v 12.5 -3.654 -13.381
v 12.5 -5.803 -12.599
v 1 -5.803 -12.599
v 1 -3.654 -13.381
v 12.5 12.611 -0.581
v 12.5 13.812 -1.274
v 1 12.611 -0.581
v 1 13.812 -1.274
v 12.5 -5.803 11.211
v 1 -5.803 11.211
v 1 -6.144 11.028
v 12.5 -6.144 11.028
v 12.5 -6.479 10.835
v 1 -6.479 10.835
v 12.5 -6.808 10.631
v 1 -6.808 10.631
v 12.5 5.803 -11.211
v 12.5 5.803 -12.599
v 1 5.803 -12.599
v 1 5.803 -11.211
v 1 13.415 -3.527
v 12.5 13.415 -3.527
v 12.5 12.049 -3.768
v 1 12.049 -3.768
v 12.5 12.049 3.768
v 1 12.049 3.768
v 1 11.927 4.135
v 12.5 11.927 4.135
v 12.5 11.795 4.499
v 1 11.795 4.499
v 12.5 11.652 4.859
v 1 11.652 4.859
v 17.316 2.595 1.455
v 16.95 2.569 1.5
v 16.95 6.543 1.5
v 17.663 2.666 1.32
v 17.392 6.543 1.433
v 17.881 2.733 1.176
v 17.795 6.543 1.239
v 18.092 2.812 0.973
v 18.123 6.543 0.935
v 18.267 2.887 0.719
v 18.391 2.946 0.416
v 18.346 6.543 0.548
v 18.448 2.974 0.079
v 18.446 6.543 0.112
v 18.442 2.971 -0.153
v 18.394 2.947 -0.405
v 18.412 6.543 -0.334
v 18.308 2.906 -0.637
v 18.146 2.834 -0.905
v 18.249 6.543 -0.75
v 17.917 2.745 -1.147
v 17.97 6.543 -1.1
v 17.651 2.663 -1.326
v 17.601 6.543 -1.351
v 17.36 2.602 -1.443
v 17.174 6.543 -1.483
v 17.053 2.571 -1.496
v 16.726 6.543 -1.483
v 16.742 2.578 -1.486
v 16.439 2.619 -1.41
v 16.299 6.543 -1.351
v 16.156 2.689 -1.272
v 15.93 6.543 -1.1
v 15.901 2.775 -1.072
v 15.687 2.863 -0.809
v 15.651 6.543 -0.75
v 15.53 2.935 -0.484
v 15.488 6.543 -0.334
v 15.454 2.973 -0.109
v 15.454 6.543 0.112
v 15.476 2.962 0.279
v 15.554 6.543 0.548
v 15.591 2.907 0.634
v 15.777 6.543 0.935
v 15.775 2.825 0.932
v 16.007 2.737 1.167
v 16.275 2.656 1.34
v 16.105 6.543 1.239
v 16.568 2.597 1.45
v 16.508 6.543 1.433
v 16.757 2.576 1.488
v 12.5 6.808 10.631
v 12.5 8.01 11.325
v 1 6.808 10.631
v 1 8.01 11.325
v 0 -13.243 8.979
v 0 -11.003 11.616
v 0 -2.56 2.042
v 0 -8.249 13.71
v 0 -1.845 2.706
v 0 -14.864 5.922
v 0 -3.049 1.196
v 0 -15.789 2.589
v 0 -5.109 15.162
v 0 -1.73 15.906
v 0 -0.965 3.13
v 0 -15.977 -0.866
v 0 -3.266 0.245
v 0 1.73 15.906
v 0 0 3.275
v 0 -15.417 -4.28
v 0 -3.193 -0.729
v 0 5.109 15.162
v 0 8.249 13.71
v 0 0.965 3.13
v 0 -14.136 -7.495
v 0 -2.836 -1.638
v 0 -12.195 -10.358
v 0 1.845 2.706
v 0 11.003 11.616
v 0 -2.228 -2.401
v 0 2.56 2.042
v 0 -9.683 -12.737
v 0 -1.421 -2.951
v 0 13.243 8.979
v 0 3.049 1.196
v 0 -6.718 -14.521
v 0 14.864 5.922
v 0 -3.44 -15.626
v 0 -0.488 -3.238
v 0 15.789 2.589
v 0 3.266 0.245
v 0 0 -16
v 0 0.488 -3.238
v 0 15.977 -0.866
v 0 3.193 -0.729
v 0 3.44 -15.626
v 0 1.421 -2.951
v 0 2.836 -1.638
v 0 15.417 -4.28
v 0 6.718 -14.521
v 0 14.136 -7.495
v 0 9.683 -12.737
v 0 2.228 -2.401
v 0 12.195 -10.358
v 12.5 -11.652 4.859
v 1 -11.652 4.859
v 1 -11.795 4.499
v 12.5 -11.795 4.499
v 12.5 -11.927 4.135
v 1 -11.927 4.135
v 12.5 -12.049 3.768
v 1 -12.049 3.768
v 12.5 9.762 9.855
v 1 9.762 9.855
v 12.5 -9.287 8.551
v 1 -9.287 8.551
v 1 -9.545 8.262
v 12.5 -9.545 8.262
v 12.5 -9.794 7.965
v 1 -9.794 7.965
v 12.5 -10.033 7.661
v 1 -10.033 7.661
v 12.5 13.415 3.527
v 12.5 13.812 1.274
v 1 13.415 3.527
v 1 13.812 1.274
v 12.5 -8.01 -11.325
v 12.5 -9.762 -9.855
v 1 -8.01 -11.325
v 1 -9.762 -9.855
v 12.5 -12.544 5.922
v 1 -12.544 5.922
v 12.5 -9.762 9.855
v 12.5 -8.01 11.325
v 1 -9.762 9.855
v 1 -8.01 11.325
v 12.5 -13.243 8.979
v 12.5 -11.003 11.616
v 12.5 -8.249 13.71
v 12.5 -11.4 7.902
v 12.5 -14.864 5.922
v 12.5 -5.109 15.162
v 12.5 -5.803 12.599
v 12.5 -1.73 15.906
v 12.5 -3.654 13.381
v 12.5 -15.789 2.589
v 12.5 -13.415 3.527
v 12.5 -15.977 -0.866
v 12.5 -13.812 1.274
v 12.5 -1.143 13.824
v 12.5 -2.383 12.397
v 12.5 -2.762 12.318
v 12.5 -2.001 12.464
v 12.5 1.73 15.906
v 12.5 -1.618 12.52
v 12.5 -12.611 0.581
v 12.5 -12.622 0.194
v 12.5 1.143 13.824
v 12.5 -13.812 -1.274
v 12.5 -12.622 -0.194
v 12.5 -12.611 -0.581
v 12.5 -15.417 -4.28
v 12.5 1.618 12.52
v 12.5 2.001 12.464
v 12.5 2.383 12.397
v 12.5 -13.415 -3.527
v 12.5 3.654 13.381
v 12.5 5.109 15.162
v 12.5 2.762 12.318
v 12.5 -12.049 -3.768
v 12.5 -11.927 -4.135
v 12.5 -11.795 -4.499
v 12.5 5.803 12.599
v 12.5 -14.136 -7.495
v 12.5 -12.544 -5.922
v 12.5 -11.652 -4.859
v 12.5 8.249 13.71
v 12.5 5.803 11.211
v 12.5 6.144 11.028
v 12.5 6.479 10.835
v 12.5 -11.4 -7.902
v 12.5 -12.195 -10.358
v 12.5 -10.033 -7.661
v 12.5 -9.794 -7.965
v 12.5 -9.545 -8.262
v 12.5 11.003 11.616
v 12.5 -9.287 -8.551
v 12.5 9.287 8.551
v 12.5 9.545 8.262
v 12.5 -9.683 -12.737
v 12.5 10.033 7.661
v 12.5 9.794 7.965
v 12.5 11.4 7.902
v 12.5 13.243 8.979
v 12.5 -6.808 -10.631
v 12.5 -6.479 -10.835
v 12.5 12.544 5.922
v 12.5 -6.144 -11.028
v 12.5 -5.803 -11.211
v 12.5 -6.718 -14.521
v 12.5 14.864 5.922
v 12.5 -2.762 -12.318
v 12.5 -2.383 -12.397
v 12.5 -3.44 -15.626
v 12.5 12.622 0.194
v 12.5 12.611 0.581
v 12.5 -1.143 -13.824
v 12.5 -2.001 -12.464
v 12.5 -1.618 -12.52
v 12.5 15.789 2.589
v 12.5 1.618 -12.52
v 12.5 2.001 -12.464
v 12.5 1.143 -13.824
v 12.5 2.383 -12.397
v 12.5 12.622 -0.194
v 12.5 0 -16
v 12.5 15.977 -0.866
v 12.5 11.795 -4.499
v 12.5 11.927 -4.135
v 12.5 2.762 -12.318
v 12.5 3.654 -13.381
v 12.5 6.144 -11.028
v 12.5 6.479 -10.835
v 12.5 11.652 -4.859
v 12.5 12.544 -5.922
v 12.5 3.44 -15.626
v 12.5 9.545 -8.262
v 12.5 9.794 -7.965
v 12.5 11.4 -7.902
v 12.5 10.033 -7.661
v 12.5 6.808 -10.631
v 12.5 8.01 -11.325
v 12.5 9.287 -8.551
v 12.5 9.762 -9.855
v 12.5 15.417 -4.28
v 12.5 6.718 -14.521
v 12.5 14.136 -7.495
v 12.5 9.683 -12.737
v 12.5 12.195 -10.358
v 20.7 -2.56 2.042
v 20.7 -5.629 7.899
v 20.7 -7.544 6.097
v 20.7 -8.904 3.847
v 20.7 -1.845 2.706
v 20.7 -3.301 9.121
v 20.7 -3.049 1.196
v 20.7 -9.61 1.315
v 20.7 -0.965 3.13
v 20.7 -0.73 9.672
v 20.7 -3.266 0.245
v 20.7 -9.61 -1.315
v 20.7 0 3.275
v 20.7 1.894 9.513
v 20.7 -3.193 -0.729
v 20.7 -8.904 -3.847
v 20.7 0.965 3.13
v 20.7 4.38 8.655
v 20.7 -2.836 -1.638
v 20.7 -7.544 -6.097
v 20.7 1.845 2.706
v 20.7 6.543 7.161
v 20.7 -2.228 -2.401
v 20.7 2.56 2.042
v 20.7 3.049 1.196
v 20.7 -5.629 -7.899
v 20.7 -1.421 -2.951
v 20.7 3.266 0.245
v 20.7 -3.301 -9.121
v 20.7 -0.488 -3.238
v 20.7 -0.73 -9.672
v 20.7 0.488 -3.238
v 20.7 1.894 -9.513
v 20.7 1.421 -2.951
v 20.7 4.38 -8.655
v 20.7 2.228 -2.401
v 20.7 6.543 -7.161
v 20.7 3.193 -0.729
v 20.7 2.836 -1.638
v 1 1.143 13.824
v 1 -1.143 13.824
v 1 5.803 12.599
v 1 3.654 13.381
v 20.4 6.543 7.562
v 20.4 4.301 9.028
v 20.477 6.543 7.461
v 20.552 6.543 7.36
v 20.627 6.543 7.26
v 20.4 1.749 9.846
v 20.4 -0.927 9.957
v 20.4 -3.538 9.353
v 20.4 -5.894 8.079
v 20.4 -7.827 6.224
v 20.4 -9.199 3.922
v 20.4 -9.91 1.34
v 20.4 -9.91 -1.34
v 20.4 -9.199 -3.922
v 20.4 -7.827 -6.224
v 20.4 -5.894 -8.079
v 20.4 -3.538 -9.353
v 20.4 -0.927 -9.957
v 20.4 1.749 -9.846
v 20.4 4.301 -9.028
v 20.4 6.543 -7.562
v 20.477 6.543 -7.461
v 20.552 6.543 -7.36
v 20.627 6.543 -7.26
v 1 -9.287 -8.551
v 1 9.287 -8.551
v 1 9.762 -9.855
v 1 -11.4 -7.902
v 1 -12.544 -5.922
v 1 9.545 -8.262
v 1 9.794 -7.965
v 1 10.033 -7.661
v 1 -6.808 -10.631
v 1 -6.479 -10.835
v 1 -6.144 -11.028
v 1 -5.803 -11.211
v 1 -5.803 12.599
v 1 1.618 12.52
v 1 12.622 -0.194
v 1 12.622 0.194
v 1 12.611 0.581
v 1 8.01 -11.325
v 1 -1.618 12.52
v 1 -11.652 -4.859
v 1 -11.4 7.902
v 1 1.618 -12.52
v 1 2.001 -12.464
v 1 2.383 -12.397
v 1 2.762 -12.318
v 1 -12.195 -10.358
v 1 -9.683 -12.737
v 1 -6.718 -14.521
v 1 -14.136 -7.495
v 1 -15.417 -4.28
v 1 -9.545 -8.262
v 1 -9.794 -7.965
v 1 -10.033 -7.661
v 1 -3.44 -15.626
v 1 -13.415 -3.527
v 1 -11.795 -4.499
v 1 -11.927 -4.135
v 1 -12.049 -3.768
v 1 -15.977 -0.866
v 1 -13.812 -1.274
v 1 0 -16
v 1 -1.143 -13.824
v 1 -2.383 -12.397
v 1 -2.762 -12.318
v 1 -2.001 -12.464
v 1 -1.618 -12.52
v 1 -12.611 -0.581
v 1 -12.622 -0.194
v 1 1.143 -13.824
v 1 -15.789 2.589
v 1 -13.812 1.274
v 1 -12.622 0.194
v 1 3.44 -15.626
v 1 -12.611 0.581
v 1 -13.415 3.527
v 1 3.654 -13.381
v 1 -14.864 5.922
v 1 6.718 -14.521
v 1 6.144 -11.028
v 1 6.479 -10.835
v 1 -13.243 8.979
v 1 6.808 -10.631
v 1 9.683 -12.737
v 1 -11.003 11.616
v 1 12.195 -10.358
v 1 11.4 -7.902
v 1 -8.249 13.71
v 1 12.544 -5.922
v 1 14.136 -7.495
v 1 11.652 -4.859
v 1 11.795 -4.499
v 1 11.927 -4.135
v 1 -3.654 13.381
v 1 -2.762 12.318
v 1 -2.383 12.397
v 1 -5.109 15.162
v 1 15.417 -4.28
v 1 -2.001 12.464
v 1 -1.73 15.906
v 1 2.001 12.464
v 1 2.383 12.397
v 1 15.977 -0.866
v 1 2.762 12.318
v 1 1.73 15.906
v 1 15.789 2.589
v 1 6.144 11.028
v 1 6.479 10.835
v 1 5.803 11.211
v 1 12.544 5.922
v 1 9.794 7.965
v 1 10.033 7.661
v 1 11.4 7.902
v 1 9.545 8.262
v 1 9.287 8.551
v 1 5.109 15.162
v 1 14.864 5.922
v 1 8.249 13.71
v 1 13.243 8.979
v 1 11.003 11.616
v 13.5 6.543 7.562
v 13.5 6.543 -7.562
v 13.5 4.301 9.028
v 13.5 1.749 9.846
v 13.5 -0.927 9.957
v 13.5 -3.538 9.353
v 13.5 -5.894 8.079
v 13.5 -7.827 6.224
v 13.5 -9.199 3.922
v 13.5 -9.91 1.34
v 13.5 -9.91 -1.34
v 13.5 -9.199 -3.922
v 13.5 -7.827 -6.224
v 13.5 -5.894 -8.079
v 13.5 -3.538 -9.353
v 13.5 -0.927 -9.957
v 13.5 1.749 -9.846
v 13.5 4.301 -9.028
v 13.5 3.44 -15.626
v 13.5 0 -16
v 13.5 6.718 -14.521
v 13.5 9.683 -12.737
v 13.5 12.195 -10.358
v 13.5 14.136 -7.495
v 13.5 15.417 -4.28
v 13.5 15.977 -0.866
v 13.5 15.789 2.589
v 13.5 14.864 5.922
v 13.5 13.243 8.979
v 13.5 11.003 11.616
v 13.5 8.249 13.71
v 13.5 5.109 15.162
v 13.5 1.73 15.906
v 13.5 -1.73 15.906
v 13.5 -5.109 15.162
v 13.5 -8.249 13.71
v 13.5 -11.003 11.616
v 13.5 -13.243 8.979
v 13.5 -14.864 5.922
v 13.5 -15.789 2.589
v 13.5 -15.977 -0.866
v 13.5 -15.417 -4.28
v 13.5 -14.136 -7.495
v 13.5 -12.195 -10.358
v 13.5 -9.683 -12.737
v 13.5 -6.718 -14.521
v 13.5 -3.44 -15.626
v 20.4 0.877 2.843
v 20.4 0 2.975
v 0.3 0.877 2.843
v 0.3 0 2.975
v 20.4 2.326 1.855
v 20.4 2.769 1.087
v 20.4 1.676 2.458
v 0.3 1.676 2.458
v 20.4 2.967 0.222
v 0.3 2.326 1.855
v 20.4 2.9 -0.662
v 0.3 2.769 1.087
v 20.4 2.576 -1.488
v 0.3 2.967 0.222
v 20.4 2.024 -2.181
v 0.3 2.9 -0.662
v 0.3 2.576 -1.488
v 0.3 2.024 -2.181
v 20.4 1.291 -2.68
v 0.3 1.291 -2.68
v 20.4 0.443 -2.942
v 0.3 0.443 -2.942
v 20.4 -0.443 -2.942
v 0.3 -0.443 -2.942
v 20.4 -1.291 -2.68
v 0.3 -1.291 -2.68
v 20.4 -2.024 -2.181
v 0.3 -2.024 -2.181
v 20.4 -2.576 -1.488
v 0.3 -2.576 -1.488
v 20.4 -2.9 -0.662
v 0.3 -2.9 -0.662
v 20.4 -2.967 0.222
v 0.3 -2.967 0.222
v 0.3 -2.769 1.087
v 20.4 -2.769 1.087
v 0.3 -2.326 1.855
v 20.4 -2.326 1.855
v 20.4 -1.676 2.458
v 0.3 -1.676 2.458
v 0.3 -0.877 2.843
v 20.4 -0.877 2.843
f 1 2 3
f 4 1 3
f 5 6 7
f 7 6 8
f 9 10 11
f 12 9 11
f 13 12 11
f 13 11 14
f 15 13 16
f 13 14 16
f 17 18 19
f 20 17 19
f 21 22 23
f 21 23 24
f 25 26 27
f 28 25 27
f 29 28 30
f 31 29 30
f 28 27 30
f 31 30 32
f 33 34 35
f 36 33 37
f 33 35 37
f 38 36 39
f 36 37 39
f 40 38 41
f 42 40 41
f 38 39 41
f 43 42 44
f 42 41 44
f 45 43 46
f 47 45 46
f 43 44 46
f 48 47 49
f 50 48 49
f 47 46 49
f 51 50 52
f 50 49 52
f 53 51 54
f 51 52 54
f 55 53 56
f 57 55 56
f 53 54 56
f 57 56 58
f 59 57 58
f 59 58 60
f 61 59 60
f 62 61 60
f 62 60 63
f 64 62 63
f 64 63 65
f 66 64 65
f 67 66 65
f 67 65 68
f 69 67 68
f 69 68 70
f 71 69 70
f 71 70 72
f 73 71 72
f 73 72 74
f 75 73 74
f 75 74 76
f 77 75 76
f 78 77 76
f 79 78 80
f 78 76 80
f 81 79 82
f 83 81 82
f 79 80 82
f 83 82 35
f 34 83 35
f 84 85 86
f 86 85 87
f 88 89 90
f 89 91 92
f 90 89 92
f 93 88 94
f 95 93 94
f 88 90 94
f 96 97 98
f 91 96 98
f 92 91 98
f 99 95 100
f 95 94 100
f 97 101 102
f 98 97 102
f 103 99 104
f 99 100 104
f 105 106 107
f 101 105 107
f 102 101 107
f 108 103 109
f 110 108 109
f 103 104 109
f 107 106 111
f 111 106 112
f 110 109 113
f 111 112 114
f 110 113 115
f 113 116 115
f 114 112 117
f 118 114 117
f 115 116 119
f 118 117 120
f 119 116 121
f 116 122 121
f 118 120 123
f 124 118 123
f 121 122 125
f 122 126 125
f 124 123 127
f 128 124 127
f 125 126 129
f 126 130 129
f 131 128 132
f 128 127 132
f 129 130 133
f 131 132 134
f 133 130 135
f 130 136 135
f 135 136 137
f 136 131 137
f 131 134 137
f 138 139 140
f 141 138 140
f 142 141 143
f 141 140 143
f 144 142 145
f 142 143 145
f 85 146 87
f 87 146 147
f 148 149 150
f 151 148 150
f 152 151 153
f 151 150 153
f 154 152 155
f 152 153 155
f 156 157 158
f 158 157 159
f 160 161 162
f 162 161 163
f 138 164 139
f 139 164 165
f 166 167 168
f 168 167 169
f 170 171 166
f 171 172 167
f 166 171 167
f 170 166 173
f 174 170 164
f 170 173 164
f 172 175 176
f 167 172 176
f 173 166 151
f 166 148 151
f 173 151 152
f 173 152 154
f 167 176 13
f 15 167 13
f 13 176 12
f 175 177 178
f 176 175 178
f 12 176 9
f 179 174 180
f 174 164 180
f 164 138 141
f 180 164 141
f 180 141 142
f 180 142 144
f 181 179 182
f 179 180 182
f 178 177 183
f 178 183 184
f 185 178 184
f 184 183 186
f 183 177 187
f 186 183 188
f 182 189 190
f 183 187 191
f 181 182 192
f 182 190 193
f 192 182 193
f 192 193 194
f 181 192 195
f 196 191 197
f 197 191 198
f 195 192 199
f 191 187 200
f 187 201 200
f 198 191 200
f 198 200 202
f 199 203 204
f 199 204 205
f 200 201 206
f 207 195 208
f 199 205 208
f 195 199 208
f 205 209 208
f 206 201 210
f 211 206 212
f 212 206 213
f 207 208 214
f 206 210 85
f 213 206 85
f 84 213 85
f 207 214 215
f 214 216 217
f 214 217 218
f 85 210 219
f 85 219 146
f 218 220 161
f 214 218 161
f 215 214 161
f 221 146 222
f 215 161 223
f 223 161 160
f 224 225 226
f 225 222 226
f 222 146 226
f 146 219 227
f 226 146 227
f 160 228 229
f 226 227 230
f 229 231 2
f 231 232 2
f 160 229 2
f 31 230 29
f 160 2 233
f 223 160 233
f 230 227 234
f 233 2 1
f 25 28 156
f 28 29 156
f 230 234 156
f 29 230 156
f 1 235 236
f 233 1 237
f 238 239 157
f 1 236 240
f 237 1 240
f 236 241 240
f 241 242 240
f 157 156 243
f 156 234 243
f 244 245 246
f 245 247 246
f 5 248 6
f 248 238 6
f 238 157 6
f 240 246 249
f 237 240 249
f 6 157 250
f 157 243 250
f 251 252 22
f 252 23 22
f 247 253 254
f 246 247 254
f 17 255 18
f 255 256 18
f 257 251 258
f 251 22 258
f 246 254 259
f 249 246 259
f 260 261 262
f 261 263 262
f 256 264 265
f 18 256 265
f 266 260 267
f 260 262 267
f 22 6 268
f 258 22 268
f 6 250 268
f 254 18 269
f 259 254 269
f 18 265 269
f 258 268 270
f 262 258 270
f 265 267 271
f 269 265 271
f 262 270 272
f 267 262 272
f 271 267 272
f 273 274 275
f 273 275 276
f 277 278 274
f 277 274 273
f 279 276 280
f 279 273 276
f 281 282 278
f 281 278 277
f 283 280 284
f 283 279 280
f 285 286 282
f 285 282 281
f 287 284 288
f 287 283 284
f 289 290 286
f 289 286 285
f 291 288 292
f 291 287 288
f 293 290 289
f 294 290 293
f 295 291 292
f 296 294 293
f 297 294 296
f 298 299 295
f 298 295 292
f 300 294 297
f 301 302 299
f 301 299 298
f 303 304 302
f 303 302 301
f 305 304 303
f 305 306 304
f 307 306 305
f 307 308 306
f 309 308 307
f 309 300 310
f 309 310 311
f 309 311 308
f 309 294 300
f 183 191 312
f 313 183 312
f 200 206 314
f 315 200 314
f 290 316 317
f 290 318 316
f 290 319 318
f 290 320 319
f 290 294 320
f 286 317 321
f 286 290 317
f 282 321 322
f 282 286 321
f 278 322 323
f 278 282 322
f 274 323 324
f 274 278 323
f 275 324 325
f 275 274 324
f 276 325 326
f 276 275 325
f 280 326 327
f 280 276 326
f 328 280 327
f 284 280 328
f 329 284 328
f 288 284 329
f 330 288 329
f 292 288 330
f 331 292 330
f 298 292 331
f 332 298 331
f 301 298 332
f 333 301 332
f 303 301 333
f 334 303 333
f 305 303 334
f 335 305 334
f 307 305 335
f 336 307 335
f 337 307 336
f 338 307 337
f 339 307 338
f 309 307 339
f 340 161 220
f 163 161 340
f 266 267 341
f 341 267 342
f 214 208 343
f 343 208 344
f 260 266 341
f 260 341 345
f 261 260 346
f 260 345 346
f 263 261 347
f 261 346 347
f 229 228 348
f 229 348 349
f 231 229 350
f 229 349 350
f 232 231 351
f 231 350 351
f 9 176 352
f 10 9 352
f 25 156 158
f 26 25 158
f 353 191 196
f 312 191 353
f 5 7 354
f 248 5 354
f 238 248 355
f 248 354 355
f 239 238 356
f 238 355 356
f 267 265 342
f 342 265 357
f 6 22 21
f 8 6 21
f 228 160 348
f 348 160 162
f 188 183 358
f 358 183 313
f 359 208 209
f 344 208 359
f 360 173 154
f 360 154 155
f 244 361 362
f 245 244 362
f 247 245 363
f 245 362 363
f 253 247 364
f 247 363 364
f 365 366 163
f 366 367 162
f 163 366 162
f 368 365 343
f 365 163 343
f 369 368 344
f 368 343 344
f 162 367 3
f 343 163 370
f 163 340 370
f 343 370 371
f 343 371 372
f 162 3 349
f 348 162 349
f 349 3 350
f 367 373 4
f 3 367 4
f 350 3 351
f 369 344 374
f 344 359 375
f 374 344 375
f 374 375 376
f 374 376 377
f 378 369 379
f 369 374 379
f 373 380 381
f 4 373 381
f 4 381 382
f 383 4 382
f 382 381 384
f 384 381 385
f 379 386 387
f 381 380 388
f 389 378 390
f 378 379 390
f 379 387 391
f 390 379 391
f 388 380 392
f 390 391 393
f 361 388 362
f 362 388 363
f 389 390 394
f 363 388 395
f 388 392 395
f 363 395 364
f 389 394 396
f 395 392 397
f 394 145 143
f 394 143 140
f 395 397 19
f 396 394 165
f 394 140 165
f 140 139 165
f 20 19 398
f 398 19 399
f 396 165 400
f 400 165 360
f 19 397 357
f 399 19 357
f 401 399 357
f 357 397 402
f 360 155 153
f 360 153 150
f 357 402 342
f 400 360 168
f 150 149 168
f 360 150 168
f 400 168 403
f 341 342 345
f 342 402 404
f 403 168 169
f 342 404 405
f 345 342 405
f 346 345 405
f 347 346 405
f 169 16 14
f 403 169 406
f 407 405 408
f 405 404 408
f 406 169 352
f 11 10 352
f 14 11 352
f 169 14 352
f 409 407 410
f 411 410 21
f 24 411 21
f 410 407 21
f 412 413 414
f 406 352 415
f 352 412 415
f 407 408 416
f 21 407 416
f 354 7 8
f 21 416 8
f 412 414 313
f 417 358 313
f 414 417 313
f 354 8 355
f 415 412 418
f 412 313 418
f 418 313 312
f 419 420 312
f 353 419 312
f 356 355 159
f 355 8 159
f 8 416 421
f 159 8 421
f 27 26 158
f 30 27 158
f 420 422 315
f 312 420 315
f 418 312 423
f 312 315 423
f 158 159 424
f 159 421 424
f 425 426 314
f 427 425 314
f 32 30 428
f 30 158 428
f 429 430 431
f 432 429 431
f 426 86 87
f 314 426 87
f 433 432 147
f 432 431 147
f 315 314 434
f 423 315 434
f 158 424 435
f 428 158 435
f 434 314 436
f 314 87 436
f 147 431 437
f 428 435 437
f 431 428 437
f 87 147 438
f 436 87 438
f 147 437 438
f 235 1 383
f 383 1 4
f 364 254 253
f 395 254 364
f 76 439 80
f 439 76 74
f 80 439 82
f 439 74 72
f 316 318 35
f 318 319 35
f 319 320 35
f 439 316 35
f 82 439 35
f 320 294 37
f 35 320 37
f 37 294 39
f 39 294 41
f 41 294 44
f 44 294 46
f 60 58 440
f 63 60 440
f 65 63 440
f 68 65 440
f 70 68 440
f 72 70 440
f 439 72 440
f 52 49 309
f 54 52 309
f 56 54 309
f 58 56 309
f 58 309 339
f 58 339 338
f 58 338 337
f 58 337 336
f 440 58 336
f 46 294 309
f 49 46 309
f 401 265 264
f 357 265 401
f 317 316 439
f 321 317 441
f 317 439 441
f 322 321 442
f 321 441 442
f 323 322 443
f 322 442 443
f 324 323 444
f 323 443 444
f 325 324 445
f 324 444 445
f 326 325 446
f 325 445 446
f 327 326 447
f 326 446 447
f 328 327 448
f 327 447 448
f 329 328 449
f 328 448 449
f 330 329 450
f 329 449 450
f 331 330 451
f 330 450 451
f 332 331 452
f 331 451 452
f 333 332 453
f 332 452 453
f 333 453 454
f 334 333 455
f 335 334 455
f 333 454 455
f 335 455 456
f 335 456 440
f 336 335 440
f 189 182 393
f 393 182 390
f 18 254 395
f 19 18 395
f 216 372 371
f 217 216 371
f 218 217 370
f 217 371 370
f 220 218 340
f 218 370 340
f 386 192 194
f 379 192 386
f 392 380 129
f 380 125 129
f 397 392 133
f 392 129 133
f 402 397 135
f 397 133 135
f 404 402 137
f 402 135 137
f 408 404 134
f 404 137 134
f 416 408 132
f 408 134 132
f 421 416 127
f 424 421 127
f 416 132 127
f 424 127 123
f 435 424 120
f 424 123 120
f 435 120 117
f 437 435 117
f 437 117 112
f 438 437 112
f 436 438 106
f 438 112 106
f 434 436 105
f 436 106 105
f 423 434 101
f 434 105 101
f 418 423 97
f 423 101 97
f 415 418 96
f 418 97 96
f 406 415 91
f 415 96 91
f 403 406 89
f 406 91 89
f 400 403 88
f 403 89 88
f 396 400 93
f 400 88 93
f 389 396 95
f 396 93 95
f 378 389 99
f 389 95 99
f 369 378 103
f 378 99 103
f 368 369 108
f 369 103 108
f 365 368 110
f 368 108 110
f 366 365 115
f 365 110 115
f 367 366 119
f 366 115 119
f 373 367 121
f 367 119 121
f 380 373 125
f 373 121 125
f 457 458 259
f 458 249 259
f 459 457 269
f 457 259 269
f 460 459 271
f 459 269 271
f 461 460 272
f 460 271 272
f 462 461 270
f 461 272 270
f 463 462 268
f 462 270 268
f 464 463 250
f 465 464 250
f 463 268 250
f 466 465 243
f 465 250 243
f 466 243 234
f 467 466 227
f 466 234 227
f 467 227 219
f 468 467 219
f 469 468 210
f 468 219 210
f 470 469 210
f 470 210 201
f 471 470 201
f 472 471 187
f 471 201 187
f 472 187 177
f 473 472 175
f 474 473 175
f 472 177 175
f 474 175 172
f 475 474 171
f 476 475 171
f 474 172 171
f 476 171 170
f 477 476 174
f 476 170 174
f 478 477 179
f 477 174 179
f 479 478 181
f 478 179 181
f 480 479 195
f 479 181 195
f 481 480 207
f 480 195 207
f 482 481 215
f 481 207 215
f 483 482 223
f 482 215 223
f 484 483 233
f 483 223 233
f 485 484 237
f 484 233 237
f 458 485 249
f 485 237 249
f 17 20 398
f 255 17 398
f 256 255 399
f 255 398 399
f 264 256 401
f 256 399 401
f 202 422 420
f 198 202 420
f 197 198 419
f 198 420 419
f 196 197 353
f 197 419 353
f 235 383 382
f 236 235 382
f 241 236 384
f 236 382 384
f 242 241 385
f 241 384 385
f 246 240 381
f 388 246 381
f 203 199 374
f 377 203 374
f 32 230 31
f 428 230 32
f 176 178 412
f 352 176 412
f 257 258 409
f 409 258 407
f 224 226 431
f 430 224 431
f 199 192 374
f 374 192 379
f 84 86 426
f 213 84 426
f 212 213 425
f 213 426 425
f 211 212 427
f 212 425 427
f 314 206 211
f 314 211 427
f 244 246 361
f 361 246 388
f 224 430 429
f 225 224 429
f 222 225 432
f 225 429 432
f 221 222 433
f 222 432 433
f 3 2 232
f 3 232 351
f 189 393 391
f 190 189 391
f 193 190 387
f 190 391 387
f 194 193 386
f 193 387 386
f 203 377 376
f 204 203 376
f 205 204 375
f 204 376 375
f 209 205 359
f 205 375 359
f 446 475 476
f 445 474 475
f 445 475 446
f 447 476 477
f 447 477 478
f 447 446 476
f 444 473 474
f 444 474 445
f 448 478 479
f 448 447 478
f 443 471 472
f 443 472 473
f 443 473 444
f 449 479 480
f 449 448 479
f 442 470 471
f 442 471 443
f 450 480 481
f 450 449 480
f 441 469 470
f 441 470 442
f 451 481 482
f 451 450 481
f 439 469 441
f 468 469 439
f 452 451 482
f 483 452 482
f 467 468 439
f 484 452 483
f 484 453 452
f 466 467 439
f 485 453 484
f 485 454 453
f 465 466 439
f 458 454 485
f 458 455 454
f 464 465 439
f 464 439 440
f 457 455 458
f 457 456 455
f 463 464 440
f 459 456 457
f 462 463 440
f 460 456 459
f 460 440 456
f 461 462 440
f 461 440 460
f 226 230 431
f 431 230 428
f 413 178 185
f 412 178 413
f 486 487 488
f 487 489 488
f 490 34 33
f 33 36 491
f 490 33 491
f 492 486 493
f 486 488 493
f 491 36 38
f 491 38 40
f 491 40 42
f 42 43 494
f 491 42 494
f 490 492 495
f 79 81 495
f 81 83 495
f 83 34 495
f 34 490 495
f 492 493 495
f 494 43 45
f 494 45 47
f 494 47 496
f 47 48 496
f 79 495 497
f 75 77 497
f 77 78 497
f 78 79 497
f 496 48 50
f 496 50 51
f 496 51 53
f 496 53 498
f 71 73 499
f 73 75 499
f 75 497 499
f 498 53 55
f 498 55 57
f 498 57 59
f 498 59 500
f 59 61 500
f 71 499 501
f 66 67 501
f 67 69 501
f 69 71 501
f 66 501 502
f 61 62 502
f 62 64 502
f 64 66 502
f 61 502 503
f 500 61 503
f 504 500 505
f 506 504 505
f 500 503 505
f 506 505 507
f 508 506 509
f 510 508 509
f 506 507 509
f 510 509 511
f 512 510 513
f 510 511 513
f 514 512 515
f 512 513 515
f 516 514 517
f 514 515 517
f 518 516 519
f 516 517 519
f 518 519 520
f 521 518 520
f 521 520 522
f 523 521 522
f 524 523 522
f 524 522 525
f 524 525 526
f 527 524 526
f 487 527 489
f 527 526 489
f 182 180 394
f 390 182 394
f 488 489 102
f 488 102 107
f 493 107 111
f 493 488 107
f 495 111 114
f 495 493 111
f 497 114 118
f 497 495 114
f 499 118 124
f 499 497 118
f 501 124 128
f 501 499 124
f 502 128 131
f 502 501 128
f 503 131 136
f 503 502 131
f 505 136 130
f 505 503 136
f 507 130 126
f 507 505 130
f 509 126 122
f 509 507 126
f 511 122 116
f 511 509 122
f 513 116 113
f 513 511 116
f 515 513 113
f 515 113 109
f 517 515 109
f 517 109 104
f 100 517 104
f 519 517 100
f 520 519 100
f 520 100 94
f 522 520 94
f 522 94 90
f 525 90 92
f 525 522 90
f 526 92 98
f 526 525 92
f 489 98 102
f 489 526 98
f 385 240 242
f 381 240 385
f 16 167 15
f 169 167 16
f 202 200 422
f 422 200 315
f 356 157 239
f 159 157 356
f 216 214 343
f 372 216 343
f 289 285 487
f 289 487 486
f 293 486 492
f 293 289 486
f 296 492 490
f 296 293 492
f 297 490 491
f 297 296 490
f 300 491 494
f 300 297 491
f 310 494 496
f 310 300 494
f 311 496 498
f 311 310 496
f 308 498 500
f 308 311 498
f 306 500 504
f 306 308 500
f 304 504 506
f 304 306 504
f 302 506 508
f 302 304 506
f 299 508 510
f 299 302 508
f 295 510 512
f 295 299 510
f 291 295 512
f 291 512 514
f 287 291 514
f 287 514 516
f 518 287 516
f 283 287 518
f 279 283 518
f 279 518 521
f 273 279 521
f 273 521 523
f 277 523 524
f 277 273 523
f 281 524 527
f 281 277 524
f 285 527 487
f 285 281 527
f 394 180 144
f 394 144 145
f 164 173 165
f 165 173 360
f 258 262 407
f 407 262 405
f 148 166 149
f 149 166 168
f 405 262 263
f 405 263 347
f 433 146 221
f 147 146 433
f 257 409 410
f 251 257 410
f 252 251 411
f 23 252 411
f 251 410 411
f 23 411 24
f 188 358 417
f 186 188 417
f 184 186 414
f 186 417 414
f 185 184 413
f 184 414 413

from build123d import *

# Parameters (mm, degrees)
SKETCH2_R                = 10
BOSS_EXTRUDE1_DEPTH      = 7.2
F_6_0_6_DIAMETER_HOLE1_D = 5.95
RIB1_REACH               = 32.667
SKETCH5_WALL_W           = 74.834818822
SKETCH5_WALL_H           = 2.286845356
RIB1_DRAFT_ANGLE         = 20
RIB2_REACH               = 32.667
SKETCH6_WALL_W           = 74.834818822
SKETCH6_WALL_H           = 2.286845356
RIB2_DRAFT_ANGLE         = 20
RIB3_REACH               = 32.667
SKETCH7_WALL_W           = 74.834818822
SKETCH7_WALL_H           = 2.286845356
RIB3_DRAFT_ANGLE         = 20
RIB4_REACH               = 32.667
SKETCH8_WALL_W           = 74.834818822
SKETCH8_WALL_H           = 2.286845356
RIB4_DRAFT_ANGLE         = 20
RIB5_REACH               = 32.667
SKETCH9_WALL_W           = 74.834818822
SKETCH9_WALL_H           = 2.286845356
RIB5_DRAFT_ANGLE         = 20
RIB6_REACH               = 32.667
SKETCH10_WALL_W          = 74.834818822
SKETCH10_WALL_H          = 2.286845356
RIB6_DRAFT_ANGLE         = 20
RIB7_REACH               = 32.667
SKETCH11_WALL_W          = 74.834818822
SKETCH11_WALL_H          = 2.286845356
RIB7_DRAFT_ANGLE         = 20
RIB8_REACH               = 32.667
SKETCH12_WALL_W          = 74.834818822
SKETCH12_WALL_H          = 2.286845356
RIB8_DRAFT_ANGLE         = 20
RIB9_REACH               = 32.667
SKETCH13_WALL_W          = 74.834818822
SKETCH13_WALL_H          = 2.286845356
RIB9_DRAFT_ANGLE         = 20
RIB10_REACH              = 32.667
SKETCH14_WALL_W          = 74.834818822
SKETCH14_WALL_H          = 2.286845356
RIB10_DRAFT_ANGLE        = 20
RIB11_REACH              = 32.667
SKETCH15_WALL_W          = 74.834818822
SKETCH15_WALL_H          = 2.286845356
RIB11_DRAFT_ANGLE        = 20
RIB12_REACH              = 32.667
SKETCH16_WALL_W          = 74.834818822
SKETCH16_WALL_H          = 2.286845356
RIB12_DRAFT_ANGLE        = 20
RIB13_REACH              = 32.667
SKETCH17_WALL_W          = 74.834818822
SKETCH17_WALL_H          = 2.286845356
RIB13_DRAFT_ANGLE        = 20
RIB14_REACH              = 32.667
SKETCH18_WALL_W          = 74.834818822
SKETCH18_WALL_H          = 2.286845356
RIB14_DRAFT_ANGLE        = 20
RIB15_REACH              = 32.667
SKETCH19_WALL_W          = 74.834818822
SKETCH19_WALL_H          = 2.286845356
RIB15_DRAFT_ANGLE        = 20
RIB16_REACH              = 32.667
SKETCH20_WALL_W          = 74.834818822
SKETCH20_WALL_H          = 2.286845356
RIB16_DRAFT_ANGLE        = 20
RIB17_REACH              = 32.667
SKETCH21_WALL_W          = 74.834818822
SKETCH21_WALL_H          = 2.286845356
RIB17_DRAFT_ANGLE        = 20
RIB18_REACH              = 32.667
SKETCH22_WALL_W          = 74.834818822
SKETCH22_WALL_H          = 2.286845356
RIB18_DRAFT_ANGLE        = 20
CHAMFER1_SIZE            = 0.3
SKETCH23_W               = 15.124366872
SKETCH23_H               = 5.378173842
CUT_EXTRUDE2_DEPTH       = 7.2
SKETCH24_R               = 1.5
CUT_EXTRUDE3_DEPTH       = 7.2


with BuildPart() as part:
    # Sketch1 → Revolve1 (revolve)
    with BuildSketch(Plane.XY, mode=Mode.PRIVATE) as revolve1_sk:
        Polygon((0, 16), (0, 0), (13.5, 0), (13.5, 16), (12.5, 16), (12.5, 13.9), (12.5, 12.623944878), (1, 12.623944878), (1, 13.9), (1, 16), align=None)
    revolve(revolve1_sk.sketch.rotate(Axis((0, 0, 0), (1, 0, 0)), 270), axis=Axis((0, 0, 0), (1, 0, 0)))

    # Sketch2 → Boss-Extrude1 (add)
    with BuildSketch(Plane(origin=(13.5, 0, 0), x_dir=(0, 0, -1), z_dir=(1, 0, 0))):
        Circle(SKETCH2_R)
    extrude(amount=BOSS_EXTRUDE1_DEPTH)

    # Ø6.0 (6) Diameter Hole1 (through all)
    with Locations(Plane(origin=(20.7, 0, 0), x_dir=(0, 0, -1), z_dir=(1, 0, 0))):
        with Locations((0, 0)):
            Hole(F_6_0_6_DIAMETER_HOLE1_D / 2)

    # Sketch5 wall → Rib1 (add, up to next)
    with BuildSketch(Plane(origin=(6.9, 0, 13.823944878), x_dir=(-1, 0, 0), z_dir=(0, 0, -1)), mode=Mode.PRIVATE) as rib1_sk1:
        Rectangle(SKETCH5_WALL_W, SKETCH5_WALL_H)
    rib1_tool1 = extrude(rib1_sk1.sketch, amount=RIB1_REACH, mode=Mode.PRIVATE) - part.part
    add(rib1_tool1.solids().sort_by_distance((6.9, 0, 13.823944878))[0])

    # Rib1 draft
    rib1_draft_faces = [part.faces().sort_by_distance(p)[0] for p in [
        (6.9, 1.143422678, 13.323944878),
        (6.9, -1.143422678, 13.323944878),
    ]]
    draft(rib1_draft_faces, Plane(origin=(6.9, 0, 13.823944878), x_dir=(-1, 0, 0), z_dir=(0, 0, 1)), RIB1_DRAFT_ANGLE)

    # Sketch6 wall → Rib2 (add, up to next)
    with BuildSketch(Plane(origin=(6.9, 0, -13.823944878), x_dir=(-1, 0, 0), z_dir=(0, 0, 1)), mode=Mode.PRIVATE) as rib2_sk1:
        Rectangle(SKETCH6_WALL_W, SKETCH6_WALL_H)
    rib2_tool1 = extrude(rib2_sk1.sketch, amount=RIB2_REACH, mode=Mode.PRIVATE) - part.part
    add(rib2_tool1.solids().sort_by_distance((6.9, 0, -13.823944878))[0])

    # Rib2 draft
    rib2_draft_faces = [part.faces().sort_by_distance(p)[0] for p in [
        (6.9, -1.143422678, -13.323944878),
        (6.9, 1.143422678, -13.323944878),
    ]]
    draft(rib2_draft_faces, Plane(origin=(6.9, 0, -13.823944878), x_dir=(-1, 0, 0), z_dir=(0, 0, -1)), RIB2_DRAFT_ANGLE)

    # Sketch7 wall → Rib3 (add, up to next)
    with BuildSketch(Plane(origin=(6.9, -11.971887445, -6.911972439), x_dir=(-1, 0, 0), z_dir=(0, 0.866025403784, 0.5)), mode=Mode.PRIVATE) as rib3_sk1:
        Rectangle(SKETCH7_WALL_W, SKETCH7_WALL_H)
    rib3_tool1 = extrude(rib3_sk1.sketch, amount=RIB3_REACH, mode=Mode.PRIVATE) - part.part
    add(rib3_tool1.solids().sort_by_distance((6.9, -11.971887445, -6.911972439))[0])

    # Rib3 draft
    rib3_draft_faces = [part.faces().sort_by_distance(p)[0] for p in [
        (6.9, -12.110586082, -5.671739353),
        (6.9, -10.967163404, -7.652205525),
    ]]
    draft(rib3_draft_faces, Plane(origin=(6.9, -11.971887445, -6.911972439), x_dir=(-1, 0, 0), z_dir=(0, -0.866025403784, -0.5)), RIB3_DRAFT_ANGLE)

    # Sketch8 wall → Rib4 (add, up to next)
    with BuildSketch(Plane(origin=(6.9, 4.728067609, -12.990258992), x_dir=(-1, 0, 0), z_dir=(0, -0.342020143326, 0.939692620786)), mode=Mode.PRIVATE) as rib4_sk1:
        Rectangle(SKETCH8_WALL_W, SKETCH8_WALL_H)
    rib4_tool1 = extrude(rib4_sk1.sketch, amount=RIB4_REACH, mode=Mode.PRIVATE) - part.part
    add(rib4_tool1.solids().sort_by_distance((6.9, 4.728067609, -12.990258992))[0])

    # Rib4 draft
    rib4_draft_faces = [part.faces().sort_by_distance(p)[0] for p in [
        (6.9, 3.482591685, -12.91148627),
        (6.9, 5.63152339, -12.129339093),
    ]]
    draft(rib4_draft_faces, Plane(origin=(6.9, 4.728067609, -12.990258992), x_dir=(-1, 0, 0), z_dir=(0, 0.342020143326, -0.939692620786)), RIB4_DRAFT_ANGLE)

    # Sketch9 wall → Rib5 (add, up to next)
    with BuildSketch(Plane(origin=(6.9, -4.728067609, 12.990258992), x_dir=(-1, 0, 0), z_dir=(0, 0.342020143326, -0.939692620786)), mode=Mode.PRIVATE) as rib5_sk1:
        Rectangle(SKETCH9_WALL_W, SKETCH9_WALL_H)
    rib5_tool1 = extrude(rib5_sk1.sketch, amount=RIB5_REACH, mode=Mode.PRIVATE) - part.part
    add(rib5_tool1.solids().sort_by_distance((6.9, -4.728067609, 12.990258992))[0])

    # Rib5 draft
    rib5_draft_faces = [part.faces().sort_by_distance(p)[0] for p in [
        (6.9, -3.482591685, 12.91148627),
        (6.9, -5.63152339, 12.129339093),
    ]]
    draft(rib5_draft_faces, Plane(origin=(6.9, -4.728067609, 12.990258992), x_dir=(-1, 0, 0), z_dir=(0, -0.342020143326, 0.939692620786)), RIB5_DRAFT_ANGLE)

    # Sketch10 wall → Rib6 (add, up to next)
    with BuildSketch(Plane(origin=(6.9, -13.613928093, 2.400502836), x_dir=(-1, 0, 0), z_dir=(0, 0.984807753012, -0.173648177667)), mode=Mode.PRIVATE) as rib6_sk1:
        Rectangle(SKETCH10_WALL_W, SKETCH10_WALL_H)
    rib6_tool1 = extrude(rib6_sk1.sketch, amount=RIB6_REACH, mode=Mode.PRIVATE) - part.part
    add(rib6_tool1.solids().sort_by_distance((6.9, -13.613928093, 2.400502836))[0])

    # Rib6 draft
    rib6_draft_faces = [part.faces().sort_by_distance(p)[0] for p in [
        (6.9, -12.922970952, 3.439730265),
        (6.9, -13.320077481, 1.187627229),
    ]]
    draft(rib6_draft_faces, Plane(origin=(6.9, -13.613928093, 2.400502836), x_dir=(-1, 0, 0), z_dir=(0, -0.984807753012, 0.173648177667)), RIB6_DRAFT_ANGLE)

    # Sketch11 wall → Rib7 (add, up to next)
    with BuildSketch(Plane(origin=(6.9, 13.613928093, 2.400502836), x_dir=(-1, 0, 0), z_dir=(0, -0.984807753012, -0.173648177667)), mode=Mode.PRIVATE) as rib7_sk1:
        Rectangle(SKETCH11_WALL_W, SKETCH11_WALL_H)
    rib7_tool1 = extrude(rib7_sk1.sketch, amount=RIB7_REACH, mode=Mode.PRIVATE) - part.part
    add(rib7_tool1.solids().sort_by_distance((6.9, 13.613928093, 2.400502836))[0])

    # Rib7 draft
    rib7_draft_faces = [part.faces().sort_by_distance(p)[0] for p in [
        (6.9, 13.320077481, 1.187627229),
        (6.9, 12.922970952, 3.439730265),
    ]]
    draft(rib7_draft_faces, Plane(origin=(6.9, 13.613928093, 2.400502836), x_dir=(-1, 0, 0), z_dir=(0, 0.984807753012, 0.173648177667)), RIB7_DRAFT_ANGLE)

    # Sketch12 wall → Rib8 (add, up to next)
    with BuildSketch(Plane(origin=(6.9, -13.613928093, -2.400502836), x_dir=(-1, 0, 0), z_dir=(0, 0.984807753012, 0.173648177667)), mode=Mode.PRIVATE) as rib8_sk1:
        Rectangle(SKETCH12_WALL_W, SKETCH12_WALL_H)
    rib8_tool1 = extrude(rib8_sk1.sketch, amount=RIB8_REACH, mode=Mode.PRIVATE) - part.part
    add(rib8_tool1.solids().sort_by_distance((6.9, -13.613928093, -2.400502836))[0])

    # Rib8 draft
    rib8_draft_faces = [part.faces().sort_by_distance(p)[0] for p in [
        (6.9, -13.320077481, -1.187627229),
        (6.9, -12.922970952, -3.439730265),
    ]]
    draft(rib8_draft_faces, Plane(origin=(6.9, -13.613928093, -2.400502836), x_dir=(-1, 0, 0), z_dir=(0, -0.984807753012, -0.173648177667)), RIB8_DRAFT_ANGLE)

    # Sketch13 wall → Rib9 (add, up to next)
    with BuildSketch(Plane(origin=(6.9, 11.971887445, -6.911972439), x_dir=(-1, 0, 0), z_dir=(0, -0.866025403784, 0.5)), mode=Mode.PRIVATE) as rib9_sk1:
        Rectangle(SKETCH13_WALL_W, SKETCH13_WALL_H)
    rib9_tool1 = extrude(rib9_sk1.sketch, amount=RIB9_REACH, mode=Mode.PRIVATE) - part.part
    add(rib9_tool1.solids().sort_by_distance((6.9, 11.971887445, -6.911972439))[0])

    # Rib9 draft
    rib9_draft_faces = [part.faces().sort_by_distance(p)[0] for p in [
        (6.9, 10.967163404, -7.652205525),
        (6.9, 12.110586082, -5.671739353),
    ]]
    draft(rib9_draft_faces, Plane(origin=(6.9, 11.971887445, -6.911972439), x_dir=(-1, 0, 0), z_dir=(0, 0.866025403784, -0.5)), RIB9_DRAFT_ANGLE)

    # Sketch14 wall → Rib10 (add, up to next)
    with BuildSketch(Plane(origin=(6.9, -4.728067609, -12.990258992), x_dir=(-1, 0, 0), z_dir=(0, 0.342020143326, 0.939692620786)), mode=Mode.PRIVATE) as rib10_sk1:
        Rectangle(SKETCH14_WALL_W, SKETCH14_WALL_H)
    rib10_tool1 = extrude(rib10_sk1.sketch, amount=RIB10_REACH, mode=Mode.PRIVATE) - part.part
    add(rib10_tool1.solids().sort_by_distance((6.9, -4.728067609, -12.990258992))[0])

    # Rib10 draft
    rib10_draft_faces = [part.faces().sort_by_distance(p)[0] for p in [
        (6.9, -5.63152339, -12.129339093),
        (6.9, -3.482591685, -12.91148627),
    ]]
    draft(rib10_draft_faces, Plane(origin=(6.9, -4.728067609, -12.990258992), x_dir=(-1, 0, 0), z_dir=(0, -0.342020143326, -0.939692620786)), RIB10_DRAFT_ANGLE)

    # Sketch15 wall → Rib11 (add, up to next)
    with BuildSketch(Plane(origin=(6.9, 13.613928093, -2.400502836), x_dir=(-1, 0, 0), z_dir=(0, -0.984807753012, 0.173648177667)), mode=Mode.PRIVATE) as rib11_sk1:
        Rectangle(SKETCH15_WALL_W, SKETCH15_WALL_H)
    rib11_tool1 = extrude(rib11_sk1.sketch, amount=RIB11_REACH, mode=Mode.PRIVATE) - part.part
    add(rib11_tool1.solids().sort_by_distance((6.9, 13.613928093, -2.400502836))[0])

    # Rib11 draft
    rib11_draft_faces = [part.faces().sort_by_distance(p)[0] for p in [
        (6.9, 12.922970952, -3.439730265),
        (6.9, 13.320077481, -1.187627229),
    ]]
    draft(rib11_draft_faces, Plane(origin=(6.9, 13.613928093, -2.400502836), x_dir=(-1, 0, 0), z_dir=(0, 0.984807753012, -0.173648177667)), RIB11_DRAFT_ANGLE)

    # Sketch16 wall → Rib12 (add, up to next)
    with BuildSketch(Plane(origin=(6.9, -8.885860485, 10.589756156), x_dir=(-1, 0, 0), z_dir=(0, 0.642787609687, -0.766044443119)), mode=Mode.PRIVATE) as rib12_sk1:
        Rectangle(SKETCH16_WALL_W, SKETCH16_WALL_H)
    rib12_tool1 = extrude(rib12_sk1.sketch, amount=RIB12_REACH, mode=Mode.PRIVATE) - part.part
    add(rib12_tool1.solids().sort_by_distance((6.9, -8.885860485, 10.589756156))[0])

    # Rib12 draft
    rib12_draft_faces = [part.faces().sort_by_distance(p)[0] for p in [
        (6.9, -7.688554092, 10.941711864),
        (6.9, -9.440379269, 9.471756004),
    ]]
    draft(rib12_draft_faces, Plane(origin=(6.9, -8.885860485, 10.589756156), x_dir=(-1, 0, 0), z_dir=(0, -0.642787609687, 0.766044443119)), RIB12_DRAFT_ANGLE)

    # Sketch17 wall → Rib13 (add, up to next)
    with BuildSketch(Plane(origin=(6.9, 4.728067609, 12.990258992), x_dir=(-1, 0, 0), z_dir=(0, -0.342020143326, -0.939692620786)), mode=Mode.PRIVATE) as rib13_sk1:
        Rectangle(SKETCH17_WALL_W, SKETCH17_WALL_H)
    rib13_tool1 = extrude(rib13_sk1.sketch, amount=RIB13_REACH, mode=Mode.PRIVATE) - part.part
    add(rib13_tool1.solids().sort_by_distance((6.9, 4.728067609, 12.990258992))[0])

    # Rib13 draft
    rib13_draft_faces = [part.faces().sort_by_distance(p)[0] for p in [
        (6.9, 5.63152339, 12.129339093),
        (6.9, 3.482591685, 12.91148627),
    ]]
    draft(rib13_draft_faces, Plane(origin=(6.9, 4.728067609, 12.990258992), x_dir=(-1, 0, 0), z_dir=(0, 0.342020143326, 0.939692620786)), RIB13_DRAFT_ANGLE)

    # Sketch18 wall → Rib14 (add, up to next)
    with BuildSketch(Plane(origin=(6.9, 8.885860485, 10.589756156), x_dir=(-1, 0, 0), z_dir=(0, -0.642787609687, -0.766044443119)), mode=Mode.PRIVATE) as rib14_sk1:
        Rectangle(SKETCH18_WALL_W, SKETCH18_WALL_H)
    rib14_tool1 = extrude(rib14_sk1.sketch, amount=RIB14_REACH, mode=Mode.PRIVATE) - part.part
    add(rib14_tool1.solids().sort_by_distance((6.9, 8.885860485, 10.589756156))[0])

    # Rib14 draft
    rib14_draft_faces = [part.faces().sort_by_distance(p)[0] for p in [
        (6.9, 9.440379269, 9.471756004),
        (6.9, 7.688554092, 10.941711864),
    ]]
    draft(rib14_draft_faces, Plane(origin=(6.9, 8.885860485, 10.589756156), x_dir=(-1, 0, 0), z_dir=(0, 0.642787609687, 0.766044443119)), RIB14_DRAFT_ANGLE)

    # Sketch19 wall → Rib15 (add, up to next)
    with BuildSketch(Plane(origin=(6.9, -11.971887445, 6.911972439), x_dir=(-1, 0, 0), z_dir=(0, 0.866025403784, -0.5)), mode=Mode.PRIVATE) as rib15_sk1:
        Rectangle(SKETCH19_WALL_W, SKETCH19_WALL_H)
    rib15_tool1 = extrude(rib15_sk1.sketch, amount=RIB15_REACH, mode=Mode.PRIVATE) - part.part
    add(rib15_tool1.solids().sort_by_distance((6.9, -11.971887445, 6.911972439))[0])

    # Rib15 draft
    rib15_draft_faces = [part.faces().sort_by_distance(p)[0] for p in [
        (6.9, -10.967163404, 7.652205525),
        (6.9, -12.110586082, 5.671739353),
    ]]
    draft(rib15_draft_faces, Plane(origin=(6.9, -11.971887445, 6.911972439), x_dir=(-1, 0, 0), z_dir=(0, -0.866025403784, 0.5)), RIB15_DRAFT_ANGLE)

    # Sketch20 wall → Rib16 (add, up to next)
    with BuildSketch(Plane(origin=(6.9, 11.971887445, 6.911972439), x_dir=(-1, 0, 0), z_dir=(0, -0.866025403784, -0.5)), mode=Mode.PRIVATE) as rib16_sk1:
        Rectangle(SKETCH20_WALL_W, SKETCH20_WALL_H)
    rib16_tool1 = extrude(rib16_sk1.sketch, amount=RIB16_REACH, mode=Mode.PRIVATE) - part.part
    add(rib16_tool1.solids().sort_by_distance((6.9, 11.971887445, 6.911972439))[0])

    # Rib16 draft
    rib16_draft_faces = [part.faces().sort_by_distance(p)[0] for p in [
        (6.9, 12.110586082, 5.671739353),
        (6.9, 10.967163404, 7.652205525),
    ]]
    draft(rib16_draft_faces, Plane(origin=(6.9, 11.971887445, 6.911972439), x_dir=(-1, 0, 0), z_dir=(0, 0.866025403784, 0.5)), RIB16_DRAFT_ANGLE)

    # Sketch21 wall → Rib17 (add, up to next)
    with BuildSketch(Plane(origin=(6.9, 8.885860485, -10.589756156), x_dir=(-1, 0, 0), z_dir=(0, -0.642787609687, 0.766044443119)), mode=Mode.PRIVATE) as rib17_sk1:
        Rectangle(SKETCH21_WALL_W, SKETCH21_WALL_H)
    rib17_tool1 = extrude(rib17_sk1.sketch, amount=RIB17_REACH, mode=Mode.PRIVATE) - part.part
    add(rib17_tool1.solids().sort_by_distance((6.9, 8.885860485, -10.589756156))[0])

    # Rib17 draft
    rib17_draft_faces = [part.faces().sort_by_distance(p)[0] for p in [
        (6.9, 7.688554092, -10.941711864),
        (6.9, 9.440379269, -9.471756004),
    ]]
    draft(rib17_draft_faces, Plane(origin=(6.9, 8.885860485, -10.589756156), x_dir=(-1, 0, 0), z_dir=(0, 0.642787609687, -0.766044443119)), RIB17_DRAFT_ANGLE)

    # Sketch22 wall → Rib18 (add, up to next)
    with BuildSketch(Plane(origin=(6.9, -8.885860485, -10.589756156), x_dir=(-1, 0, 0), z_dir=(0, 0.642787609687, 0.766044443119)), mode=Mode.PRIVATE) as rib18_sk1:
        Rectangle(SKETCH22_WALL_W, SKETCH22_WALL_H)
    rib18_tool1 = extrude(rib18_sk1.sketch, amount=RIB18_REACH, mode=Mode.PRIVATE) - part.part
    add(rib18_tool1.solids().sort_by_distance((6.9, -8.885860485, -10.589756156))[0])

    # Rib18 draft
    rib18_draft_faces = [part.faces().sort_by_distance(p)[0] for p in [
        (6.9, -9.440379269, -9.471756004),
        (6.9, -7.688554092, -10.941711864),
    ]]
    draft(rib18_draft_faces, Plane(origin=(6.9, -8.885860485, -10.589756156), x_dir=(-1, 0, 0), z_dir=(0, -0.642787609687, -0.766044443119)), RIB18_DRAFT_ANGLE)

    # Chamfer1
    chamfer1_edges = [part.edges().sort_by_distance(p)[0] for p in [
        (20.7, 0, 10),
        (20.7, 0, -2.975),
        (0, 0, -2.975),
    ]]
    chamfer(chamfer1_edges, length=CHAMFER1_SIZE)

    # Sketch23 → Cut-Extrude2 (cut)
    with BuildSketch(Plane(origin=(20.7, 0, 0), x_dir=(0, 0, -1), z_dir=(1, 0, 0))):
        with Locations((0, 9.232280459)):
            Rectangle(SKETCH23_W, SKETCH23_H)
    extrude(amount=-CUT_EXTRUDE2_DEPTH, mode=Mode.SUBTRACT)

    # Sketch24 → Cut-Extrude3 (cut)
    with BuildSketch(Plane(origin=(0, 6.543193538, 0), x_dir=(1, 0, 0), z_dir=(0, 1, 0))):
        with Locations(Location((16.95, 0, 0), (0, 0, 270))):
            Circle(SKETCH24_R)
    extrude(amount=-CUT_EXTRUDE3_DEPTH, mode=Mode.SUBTRACT)


solid = part.part
